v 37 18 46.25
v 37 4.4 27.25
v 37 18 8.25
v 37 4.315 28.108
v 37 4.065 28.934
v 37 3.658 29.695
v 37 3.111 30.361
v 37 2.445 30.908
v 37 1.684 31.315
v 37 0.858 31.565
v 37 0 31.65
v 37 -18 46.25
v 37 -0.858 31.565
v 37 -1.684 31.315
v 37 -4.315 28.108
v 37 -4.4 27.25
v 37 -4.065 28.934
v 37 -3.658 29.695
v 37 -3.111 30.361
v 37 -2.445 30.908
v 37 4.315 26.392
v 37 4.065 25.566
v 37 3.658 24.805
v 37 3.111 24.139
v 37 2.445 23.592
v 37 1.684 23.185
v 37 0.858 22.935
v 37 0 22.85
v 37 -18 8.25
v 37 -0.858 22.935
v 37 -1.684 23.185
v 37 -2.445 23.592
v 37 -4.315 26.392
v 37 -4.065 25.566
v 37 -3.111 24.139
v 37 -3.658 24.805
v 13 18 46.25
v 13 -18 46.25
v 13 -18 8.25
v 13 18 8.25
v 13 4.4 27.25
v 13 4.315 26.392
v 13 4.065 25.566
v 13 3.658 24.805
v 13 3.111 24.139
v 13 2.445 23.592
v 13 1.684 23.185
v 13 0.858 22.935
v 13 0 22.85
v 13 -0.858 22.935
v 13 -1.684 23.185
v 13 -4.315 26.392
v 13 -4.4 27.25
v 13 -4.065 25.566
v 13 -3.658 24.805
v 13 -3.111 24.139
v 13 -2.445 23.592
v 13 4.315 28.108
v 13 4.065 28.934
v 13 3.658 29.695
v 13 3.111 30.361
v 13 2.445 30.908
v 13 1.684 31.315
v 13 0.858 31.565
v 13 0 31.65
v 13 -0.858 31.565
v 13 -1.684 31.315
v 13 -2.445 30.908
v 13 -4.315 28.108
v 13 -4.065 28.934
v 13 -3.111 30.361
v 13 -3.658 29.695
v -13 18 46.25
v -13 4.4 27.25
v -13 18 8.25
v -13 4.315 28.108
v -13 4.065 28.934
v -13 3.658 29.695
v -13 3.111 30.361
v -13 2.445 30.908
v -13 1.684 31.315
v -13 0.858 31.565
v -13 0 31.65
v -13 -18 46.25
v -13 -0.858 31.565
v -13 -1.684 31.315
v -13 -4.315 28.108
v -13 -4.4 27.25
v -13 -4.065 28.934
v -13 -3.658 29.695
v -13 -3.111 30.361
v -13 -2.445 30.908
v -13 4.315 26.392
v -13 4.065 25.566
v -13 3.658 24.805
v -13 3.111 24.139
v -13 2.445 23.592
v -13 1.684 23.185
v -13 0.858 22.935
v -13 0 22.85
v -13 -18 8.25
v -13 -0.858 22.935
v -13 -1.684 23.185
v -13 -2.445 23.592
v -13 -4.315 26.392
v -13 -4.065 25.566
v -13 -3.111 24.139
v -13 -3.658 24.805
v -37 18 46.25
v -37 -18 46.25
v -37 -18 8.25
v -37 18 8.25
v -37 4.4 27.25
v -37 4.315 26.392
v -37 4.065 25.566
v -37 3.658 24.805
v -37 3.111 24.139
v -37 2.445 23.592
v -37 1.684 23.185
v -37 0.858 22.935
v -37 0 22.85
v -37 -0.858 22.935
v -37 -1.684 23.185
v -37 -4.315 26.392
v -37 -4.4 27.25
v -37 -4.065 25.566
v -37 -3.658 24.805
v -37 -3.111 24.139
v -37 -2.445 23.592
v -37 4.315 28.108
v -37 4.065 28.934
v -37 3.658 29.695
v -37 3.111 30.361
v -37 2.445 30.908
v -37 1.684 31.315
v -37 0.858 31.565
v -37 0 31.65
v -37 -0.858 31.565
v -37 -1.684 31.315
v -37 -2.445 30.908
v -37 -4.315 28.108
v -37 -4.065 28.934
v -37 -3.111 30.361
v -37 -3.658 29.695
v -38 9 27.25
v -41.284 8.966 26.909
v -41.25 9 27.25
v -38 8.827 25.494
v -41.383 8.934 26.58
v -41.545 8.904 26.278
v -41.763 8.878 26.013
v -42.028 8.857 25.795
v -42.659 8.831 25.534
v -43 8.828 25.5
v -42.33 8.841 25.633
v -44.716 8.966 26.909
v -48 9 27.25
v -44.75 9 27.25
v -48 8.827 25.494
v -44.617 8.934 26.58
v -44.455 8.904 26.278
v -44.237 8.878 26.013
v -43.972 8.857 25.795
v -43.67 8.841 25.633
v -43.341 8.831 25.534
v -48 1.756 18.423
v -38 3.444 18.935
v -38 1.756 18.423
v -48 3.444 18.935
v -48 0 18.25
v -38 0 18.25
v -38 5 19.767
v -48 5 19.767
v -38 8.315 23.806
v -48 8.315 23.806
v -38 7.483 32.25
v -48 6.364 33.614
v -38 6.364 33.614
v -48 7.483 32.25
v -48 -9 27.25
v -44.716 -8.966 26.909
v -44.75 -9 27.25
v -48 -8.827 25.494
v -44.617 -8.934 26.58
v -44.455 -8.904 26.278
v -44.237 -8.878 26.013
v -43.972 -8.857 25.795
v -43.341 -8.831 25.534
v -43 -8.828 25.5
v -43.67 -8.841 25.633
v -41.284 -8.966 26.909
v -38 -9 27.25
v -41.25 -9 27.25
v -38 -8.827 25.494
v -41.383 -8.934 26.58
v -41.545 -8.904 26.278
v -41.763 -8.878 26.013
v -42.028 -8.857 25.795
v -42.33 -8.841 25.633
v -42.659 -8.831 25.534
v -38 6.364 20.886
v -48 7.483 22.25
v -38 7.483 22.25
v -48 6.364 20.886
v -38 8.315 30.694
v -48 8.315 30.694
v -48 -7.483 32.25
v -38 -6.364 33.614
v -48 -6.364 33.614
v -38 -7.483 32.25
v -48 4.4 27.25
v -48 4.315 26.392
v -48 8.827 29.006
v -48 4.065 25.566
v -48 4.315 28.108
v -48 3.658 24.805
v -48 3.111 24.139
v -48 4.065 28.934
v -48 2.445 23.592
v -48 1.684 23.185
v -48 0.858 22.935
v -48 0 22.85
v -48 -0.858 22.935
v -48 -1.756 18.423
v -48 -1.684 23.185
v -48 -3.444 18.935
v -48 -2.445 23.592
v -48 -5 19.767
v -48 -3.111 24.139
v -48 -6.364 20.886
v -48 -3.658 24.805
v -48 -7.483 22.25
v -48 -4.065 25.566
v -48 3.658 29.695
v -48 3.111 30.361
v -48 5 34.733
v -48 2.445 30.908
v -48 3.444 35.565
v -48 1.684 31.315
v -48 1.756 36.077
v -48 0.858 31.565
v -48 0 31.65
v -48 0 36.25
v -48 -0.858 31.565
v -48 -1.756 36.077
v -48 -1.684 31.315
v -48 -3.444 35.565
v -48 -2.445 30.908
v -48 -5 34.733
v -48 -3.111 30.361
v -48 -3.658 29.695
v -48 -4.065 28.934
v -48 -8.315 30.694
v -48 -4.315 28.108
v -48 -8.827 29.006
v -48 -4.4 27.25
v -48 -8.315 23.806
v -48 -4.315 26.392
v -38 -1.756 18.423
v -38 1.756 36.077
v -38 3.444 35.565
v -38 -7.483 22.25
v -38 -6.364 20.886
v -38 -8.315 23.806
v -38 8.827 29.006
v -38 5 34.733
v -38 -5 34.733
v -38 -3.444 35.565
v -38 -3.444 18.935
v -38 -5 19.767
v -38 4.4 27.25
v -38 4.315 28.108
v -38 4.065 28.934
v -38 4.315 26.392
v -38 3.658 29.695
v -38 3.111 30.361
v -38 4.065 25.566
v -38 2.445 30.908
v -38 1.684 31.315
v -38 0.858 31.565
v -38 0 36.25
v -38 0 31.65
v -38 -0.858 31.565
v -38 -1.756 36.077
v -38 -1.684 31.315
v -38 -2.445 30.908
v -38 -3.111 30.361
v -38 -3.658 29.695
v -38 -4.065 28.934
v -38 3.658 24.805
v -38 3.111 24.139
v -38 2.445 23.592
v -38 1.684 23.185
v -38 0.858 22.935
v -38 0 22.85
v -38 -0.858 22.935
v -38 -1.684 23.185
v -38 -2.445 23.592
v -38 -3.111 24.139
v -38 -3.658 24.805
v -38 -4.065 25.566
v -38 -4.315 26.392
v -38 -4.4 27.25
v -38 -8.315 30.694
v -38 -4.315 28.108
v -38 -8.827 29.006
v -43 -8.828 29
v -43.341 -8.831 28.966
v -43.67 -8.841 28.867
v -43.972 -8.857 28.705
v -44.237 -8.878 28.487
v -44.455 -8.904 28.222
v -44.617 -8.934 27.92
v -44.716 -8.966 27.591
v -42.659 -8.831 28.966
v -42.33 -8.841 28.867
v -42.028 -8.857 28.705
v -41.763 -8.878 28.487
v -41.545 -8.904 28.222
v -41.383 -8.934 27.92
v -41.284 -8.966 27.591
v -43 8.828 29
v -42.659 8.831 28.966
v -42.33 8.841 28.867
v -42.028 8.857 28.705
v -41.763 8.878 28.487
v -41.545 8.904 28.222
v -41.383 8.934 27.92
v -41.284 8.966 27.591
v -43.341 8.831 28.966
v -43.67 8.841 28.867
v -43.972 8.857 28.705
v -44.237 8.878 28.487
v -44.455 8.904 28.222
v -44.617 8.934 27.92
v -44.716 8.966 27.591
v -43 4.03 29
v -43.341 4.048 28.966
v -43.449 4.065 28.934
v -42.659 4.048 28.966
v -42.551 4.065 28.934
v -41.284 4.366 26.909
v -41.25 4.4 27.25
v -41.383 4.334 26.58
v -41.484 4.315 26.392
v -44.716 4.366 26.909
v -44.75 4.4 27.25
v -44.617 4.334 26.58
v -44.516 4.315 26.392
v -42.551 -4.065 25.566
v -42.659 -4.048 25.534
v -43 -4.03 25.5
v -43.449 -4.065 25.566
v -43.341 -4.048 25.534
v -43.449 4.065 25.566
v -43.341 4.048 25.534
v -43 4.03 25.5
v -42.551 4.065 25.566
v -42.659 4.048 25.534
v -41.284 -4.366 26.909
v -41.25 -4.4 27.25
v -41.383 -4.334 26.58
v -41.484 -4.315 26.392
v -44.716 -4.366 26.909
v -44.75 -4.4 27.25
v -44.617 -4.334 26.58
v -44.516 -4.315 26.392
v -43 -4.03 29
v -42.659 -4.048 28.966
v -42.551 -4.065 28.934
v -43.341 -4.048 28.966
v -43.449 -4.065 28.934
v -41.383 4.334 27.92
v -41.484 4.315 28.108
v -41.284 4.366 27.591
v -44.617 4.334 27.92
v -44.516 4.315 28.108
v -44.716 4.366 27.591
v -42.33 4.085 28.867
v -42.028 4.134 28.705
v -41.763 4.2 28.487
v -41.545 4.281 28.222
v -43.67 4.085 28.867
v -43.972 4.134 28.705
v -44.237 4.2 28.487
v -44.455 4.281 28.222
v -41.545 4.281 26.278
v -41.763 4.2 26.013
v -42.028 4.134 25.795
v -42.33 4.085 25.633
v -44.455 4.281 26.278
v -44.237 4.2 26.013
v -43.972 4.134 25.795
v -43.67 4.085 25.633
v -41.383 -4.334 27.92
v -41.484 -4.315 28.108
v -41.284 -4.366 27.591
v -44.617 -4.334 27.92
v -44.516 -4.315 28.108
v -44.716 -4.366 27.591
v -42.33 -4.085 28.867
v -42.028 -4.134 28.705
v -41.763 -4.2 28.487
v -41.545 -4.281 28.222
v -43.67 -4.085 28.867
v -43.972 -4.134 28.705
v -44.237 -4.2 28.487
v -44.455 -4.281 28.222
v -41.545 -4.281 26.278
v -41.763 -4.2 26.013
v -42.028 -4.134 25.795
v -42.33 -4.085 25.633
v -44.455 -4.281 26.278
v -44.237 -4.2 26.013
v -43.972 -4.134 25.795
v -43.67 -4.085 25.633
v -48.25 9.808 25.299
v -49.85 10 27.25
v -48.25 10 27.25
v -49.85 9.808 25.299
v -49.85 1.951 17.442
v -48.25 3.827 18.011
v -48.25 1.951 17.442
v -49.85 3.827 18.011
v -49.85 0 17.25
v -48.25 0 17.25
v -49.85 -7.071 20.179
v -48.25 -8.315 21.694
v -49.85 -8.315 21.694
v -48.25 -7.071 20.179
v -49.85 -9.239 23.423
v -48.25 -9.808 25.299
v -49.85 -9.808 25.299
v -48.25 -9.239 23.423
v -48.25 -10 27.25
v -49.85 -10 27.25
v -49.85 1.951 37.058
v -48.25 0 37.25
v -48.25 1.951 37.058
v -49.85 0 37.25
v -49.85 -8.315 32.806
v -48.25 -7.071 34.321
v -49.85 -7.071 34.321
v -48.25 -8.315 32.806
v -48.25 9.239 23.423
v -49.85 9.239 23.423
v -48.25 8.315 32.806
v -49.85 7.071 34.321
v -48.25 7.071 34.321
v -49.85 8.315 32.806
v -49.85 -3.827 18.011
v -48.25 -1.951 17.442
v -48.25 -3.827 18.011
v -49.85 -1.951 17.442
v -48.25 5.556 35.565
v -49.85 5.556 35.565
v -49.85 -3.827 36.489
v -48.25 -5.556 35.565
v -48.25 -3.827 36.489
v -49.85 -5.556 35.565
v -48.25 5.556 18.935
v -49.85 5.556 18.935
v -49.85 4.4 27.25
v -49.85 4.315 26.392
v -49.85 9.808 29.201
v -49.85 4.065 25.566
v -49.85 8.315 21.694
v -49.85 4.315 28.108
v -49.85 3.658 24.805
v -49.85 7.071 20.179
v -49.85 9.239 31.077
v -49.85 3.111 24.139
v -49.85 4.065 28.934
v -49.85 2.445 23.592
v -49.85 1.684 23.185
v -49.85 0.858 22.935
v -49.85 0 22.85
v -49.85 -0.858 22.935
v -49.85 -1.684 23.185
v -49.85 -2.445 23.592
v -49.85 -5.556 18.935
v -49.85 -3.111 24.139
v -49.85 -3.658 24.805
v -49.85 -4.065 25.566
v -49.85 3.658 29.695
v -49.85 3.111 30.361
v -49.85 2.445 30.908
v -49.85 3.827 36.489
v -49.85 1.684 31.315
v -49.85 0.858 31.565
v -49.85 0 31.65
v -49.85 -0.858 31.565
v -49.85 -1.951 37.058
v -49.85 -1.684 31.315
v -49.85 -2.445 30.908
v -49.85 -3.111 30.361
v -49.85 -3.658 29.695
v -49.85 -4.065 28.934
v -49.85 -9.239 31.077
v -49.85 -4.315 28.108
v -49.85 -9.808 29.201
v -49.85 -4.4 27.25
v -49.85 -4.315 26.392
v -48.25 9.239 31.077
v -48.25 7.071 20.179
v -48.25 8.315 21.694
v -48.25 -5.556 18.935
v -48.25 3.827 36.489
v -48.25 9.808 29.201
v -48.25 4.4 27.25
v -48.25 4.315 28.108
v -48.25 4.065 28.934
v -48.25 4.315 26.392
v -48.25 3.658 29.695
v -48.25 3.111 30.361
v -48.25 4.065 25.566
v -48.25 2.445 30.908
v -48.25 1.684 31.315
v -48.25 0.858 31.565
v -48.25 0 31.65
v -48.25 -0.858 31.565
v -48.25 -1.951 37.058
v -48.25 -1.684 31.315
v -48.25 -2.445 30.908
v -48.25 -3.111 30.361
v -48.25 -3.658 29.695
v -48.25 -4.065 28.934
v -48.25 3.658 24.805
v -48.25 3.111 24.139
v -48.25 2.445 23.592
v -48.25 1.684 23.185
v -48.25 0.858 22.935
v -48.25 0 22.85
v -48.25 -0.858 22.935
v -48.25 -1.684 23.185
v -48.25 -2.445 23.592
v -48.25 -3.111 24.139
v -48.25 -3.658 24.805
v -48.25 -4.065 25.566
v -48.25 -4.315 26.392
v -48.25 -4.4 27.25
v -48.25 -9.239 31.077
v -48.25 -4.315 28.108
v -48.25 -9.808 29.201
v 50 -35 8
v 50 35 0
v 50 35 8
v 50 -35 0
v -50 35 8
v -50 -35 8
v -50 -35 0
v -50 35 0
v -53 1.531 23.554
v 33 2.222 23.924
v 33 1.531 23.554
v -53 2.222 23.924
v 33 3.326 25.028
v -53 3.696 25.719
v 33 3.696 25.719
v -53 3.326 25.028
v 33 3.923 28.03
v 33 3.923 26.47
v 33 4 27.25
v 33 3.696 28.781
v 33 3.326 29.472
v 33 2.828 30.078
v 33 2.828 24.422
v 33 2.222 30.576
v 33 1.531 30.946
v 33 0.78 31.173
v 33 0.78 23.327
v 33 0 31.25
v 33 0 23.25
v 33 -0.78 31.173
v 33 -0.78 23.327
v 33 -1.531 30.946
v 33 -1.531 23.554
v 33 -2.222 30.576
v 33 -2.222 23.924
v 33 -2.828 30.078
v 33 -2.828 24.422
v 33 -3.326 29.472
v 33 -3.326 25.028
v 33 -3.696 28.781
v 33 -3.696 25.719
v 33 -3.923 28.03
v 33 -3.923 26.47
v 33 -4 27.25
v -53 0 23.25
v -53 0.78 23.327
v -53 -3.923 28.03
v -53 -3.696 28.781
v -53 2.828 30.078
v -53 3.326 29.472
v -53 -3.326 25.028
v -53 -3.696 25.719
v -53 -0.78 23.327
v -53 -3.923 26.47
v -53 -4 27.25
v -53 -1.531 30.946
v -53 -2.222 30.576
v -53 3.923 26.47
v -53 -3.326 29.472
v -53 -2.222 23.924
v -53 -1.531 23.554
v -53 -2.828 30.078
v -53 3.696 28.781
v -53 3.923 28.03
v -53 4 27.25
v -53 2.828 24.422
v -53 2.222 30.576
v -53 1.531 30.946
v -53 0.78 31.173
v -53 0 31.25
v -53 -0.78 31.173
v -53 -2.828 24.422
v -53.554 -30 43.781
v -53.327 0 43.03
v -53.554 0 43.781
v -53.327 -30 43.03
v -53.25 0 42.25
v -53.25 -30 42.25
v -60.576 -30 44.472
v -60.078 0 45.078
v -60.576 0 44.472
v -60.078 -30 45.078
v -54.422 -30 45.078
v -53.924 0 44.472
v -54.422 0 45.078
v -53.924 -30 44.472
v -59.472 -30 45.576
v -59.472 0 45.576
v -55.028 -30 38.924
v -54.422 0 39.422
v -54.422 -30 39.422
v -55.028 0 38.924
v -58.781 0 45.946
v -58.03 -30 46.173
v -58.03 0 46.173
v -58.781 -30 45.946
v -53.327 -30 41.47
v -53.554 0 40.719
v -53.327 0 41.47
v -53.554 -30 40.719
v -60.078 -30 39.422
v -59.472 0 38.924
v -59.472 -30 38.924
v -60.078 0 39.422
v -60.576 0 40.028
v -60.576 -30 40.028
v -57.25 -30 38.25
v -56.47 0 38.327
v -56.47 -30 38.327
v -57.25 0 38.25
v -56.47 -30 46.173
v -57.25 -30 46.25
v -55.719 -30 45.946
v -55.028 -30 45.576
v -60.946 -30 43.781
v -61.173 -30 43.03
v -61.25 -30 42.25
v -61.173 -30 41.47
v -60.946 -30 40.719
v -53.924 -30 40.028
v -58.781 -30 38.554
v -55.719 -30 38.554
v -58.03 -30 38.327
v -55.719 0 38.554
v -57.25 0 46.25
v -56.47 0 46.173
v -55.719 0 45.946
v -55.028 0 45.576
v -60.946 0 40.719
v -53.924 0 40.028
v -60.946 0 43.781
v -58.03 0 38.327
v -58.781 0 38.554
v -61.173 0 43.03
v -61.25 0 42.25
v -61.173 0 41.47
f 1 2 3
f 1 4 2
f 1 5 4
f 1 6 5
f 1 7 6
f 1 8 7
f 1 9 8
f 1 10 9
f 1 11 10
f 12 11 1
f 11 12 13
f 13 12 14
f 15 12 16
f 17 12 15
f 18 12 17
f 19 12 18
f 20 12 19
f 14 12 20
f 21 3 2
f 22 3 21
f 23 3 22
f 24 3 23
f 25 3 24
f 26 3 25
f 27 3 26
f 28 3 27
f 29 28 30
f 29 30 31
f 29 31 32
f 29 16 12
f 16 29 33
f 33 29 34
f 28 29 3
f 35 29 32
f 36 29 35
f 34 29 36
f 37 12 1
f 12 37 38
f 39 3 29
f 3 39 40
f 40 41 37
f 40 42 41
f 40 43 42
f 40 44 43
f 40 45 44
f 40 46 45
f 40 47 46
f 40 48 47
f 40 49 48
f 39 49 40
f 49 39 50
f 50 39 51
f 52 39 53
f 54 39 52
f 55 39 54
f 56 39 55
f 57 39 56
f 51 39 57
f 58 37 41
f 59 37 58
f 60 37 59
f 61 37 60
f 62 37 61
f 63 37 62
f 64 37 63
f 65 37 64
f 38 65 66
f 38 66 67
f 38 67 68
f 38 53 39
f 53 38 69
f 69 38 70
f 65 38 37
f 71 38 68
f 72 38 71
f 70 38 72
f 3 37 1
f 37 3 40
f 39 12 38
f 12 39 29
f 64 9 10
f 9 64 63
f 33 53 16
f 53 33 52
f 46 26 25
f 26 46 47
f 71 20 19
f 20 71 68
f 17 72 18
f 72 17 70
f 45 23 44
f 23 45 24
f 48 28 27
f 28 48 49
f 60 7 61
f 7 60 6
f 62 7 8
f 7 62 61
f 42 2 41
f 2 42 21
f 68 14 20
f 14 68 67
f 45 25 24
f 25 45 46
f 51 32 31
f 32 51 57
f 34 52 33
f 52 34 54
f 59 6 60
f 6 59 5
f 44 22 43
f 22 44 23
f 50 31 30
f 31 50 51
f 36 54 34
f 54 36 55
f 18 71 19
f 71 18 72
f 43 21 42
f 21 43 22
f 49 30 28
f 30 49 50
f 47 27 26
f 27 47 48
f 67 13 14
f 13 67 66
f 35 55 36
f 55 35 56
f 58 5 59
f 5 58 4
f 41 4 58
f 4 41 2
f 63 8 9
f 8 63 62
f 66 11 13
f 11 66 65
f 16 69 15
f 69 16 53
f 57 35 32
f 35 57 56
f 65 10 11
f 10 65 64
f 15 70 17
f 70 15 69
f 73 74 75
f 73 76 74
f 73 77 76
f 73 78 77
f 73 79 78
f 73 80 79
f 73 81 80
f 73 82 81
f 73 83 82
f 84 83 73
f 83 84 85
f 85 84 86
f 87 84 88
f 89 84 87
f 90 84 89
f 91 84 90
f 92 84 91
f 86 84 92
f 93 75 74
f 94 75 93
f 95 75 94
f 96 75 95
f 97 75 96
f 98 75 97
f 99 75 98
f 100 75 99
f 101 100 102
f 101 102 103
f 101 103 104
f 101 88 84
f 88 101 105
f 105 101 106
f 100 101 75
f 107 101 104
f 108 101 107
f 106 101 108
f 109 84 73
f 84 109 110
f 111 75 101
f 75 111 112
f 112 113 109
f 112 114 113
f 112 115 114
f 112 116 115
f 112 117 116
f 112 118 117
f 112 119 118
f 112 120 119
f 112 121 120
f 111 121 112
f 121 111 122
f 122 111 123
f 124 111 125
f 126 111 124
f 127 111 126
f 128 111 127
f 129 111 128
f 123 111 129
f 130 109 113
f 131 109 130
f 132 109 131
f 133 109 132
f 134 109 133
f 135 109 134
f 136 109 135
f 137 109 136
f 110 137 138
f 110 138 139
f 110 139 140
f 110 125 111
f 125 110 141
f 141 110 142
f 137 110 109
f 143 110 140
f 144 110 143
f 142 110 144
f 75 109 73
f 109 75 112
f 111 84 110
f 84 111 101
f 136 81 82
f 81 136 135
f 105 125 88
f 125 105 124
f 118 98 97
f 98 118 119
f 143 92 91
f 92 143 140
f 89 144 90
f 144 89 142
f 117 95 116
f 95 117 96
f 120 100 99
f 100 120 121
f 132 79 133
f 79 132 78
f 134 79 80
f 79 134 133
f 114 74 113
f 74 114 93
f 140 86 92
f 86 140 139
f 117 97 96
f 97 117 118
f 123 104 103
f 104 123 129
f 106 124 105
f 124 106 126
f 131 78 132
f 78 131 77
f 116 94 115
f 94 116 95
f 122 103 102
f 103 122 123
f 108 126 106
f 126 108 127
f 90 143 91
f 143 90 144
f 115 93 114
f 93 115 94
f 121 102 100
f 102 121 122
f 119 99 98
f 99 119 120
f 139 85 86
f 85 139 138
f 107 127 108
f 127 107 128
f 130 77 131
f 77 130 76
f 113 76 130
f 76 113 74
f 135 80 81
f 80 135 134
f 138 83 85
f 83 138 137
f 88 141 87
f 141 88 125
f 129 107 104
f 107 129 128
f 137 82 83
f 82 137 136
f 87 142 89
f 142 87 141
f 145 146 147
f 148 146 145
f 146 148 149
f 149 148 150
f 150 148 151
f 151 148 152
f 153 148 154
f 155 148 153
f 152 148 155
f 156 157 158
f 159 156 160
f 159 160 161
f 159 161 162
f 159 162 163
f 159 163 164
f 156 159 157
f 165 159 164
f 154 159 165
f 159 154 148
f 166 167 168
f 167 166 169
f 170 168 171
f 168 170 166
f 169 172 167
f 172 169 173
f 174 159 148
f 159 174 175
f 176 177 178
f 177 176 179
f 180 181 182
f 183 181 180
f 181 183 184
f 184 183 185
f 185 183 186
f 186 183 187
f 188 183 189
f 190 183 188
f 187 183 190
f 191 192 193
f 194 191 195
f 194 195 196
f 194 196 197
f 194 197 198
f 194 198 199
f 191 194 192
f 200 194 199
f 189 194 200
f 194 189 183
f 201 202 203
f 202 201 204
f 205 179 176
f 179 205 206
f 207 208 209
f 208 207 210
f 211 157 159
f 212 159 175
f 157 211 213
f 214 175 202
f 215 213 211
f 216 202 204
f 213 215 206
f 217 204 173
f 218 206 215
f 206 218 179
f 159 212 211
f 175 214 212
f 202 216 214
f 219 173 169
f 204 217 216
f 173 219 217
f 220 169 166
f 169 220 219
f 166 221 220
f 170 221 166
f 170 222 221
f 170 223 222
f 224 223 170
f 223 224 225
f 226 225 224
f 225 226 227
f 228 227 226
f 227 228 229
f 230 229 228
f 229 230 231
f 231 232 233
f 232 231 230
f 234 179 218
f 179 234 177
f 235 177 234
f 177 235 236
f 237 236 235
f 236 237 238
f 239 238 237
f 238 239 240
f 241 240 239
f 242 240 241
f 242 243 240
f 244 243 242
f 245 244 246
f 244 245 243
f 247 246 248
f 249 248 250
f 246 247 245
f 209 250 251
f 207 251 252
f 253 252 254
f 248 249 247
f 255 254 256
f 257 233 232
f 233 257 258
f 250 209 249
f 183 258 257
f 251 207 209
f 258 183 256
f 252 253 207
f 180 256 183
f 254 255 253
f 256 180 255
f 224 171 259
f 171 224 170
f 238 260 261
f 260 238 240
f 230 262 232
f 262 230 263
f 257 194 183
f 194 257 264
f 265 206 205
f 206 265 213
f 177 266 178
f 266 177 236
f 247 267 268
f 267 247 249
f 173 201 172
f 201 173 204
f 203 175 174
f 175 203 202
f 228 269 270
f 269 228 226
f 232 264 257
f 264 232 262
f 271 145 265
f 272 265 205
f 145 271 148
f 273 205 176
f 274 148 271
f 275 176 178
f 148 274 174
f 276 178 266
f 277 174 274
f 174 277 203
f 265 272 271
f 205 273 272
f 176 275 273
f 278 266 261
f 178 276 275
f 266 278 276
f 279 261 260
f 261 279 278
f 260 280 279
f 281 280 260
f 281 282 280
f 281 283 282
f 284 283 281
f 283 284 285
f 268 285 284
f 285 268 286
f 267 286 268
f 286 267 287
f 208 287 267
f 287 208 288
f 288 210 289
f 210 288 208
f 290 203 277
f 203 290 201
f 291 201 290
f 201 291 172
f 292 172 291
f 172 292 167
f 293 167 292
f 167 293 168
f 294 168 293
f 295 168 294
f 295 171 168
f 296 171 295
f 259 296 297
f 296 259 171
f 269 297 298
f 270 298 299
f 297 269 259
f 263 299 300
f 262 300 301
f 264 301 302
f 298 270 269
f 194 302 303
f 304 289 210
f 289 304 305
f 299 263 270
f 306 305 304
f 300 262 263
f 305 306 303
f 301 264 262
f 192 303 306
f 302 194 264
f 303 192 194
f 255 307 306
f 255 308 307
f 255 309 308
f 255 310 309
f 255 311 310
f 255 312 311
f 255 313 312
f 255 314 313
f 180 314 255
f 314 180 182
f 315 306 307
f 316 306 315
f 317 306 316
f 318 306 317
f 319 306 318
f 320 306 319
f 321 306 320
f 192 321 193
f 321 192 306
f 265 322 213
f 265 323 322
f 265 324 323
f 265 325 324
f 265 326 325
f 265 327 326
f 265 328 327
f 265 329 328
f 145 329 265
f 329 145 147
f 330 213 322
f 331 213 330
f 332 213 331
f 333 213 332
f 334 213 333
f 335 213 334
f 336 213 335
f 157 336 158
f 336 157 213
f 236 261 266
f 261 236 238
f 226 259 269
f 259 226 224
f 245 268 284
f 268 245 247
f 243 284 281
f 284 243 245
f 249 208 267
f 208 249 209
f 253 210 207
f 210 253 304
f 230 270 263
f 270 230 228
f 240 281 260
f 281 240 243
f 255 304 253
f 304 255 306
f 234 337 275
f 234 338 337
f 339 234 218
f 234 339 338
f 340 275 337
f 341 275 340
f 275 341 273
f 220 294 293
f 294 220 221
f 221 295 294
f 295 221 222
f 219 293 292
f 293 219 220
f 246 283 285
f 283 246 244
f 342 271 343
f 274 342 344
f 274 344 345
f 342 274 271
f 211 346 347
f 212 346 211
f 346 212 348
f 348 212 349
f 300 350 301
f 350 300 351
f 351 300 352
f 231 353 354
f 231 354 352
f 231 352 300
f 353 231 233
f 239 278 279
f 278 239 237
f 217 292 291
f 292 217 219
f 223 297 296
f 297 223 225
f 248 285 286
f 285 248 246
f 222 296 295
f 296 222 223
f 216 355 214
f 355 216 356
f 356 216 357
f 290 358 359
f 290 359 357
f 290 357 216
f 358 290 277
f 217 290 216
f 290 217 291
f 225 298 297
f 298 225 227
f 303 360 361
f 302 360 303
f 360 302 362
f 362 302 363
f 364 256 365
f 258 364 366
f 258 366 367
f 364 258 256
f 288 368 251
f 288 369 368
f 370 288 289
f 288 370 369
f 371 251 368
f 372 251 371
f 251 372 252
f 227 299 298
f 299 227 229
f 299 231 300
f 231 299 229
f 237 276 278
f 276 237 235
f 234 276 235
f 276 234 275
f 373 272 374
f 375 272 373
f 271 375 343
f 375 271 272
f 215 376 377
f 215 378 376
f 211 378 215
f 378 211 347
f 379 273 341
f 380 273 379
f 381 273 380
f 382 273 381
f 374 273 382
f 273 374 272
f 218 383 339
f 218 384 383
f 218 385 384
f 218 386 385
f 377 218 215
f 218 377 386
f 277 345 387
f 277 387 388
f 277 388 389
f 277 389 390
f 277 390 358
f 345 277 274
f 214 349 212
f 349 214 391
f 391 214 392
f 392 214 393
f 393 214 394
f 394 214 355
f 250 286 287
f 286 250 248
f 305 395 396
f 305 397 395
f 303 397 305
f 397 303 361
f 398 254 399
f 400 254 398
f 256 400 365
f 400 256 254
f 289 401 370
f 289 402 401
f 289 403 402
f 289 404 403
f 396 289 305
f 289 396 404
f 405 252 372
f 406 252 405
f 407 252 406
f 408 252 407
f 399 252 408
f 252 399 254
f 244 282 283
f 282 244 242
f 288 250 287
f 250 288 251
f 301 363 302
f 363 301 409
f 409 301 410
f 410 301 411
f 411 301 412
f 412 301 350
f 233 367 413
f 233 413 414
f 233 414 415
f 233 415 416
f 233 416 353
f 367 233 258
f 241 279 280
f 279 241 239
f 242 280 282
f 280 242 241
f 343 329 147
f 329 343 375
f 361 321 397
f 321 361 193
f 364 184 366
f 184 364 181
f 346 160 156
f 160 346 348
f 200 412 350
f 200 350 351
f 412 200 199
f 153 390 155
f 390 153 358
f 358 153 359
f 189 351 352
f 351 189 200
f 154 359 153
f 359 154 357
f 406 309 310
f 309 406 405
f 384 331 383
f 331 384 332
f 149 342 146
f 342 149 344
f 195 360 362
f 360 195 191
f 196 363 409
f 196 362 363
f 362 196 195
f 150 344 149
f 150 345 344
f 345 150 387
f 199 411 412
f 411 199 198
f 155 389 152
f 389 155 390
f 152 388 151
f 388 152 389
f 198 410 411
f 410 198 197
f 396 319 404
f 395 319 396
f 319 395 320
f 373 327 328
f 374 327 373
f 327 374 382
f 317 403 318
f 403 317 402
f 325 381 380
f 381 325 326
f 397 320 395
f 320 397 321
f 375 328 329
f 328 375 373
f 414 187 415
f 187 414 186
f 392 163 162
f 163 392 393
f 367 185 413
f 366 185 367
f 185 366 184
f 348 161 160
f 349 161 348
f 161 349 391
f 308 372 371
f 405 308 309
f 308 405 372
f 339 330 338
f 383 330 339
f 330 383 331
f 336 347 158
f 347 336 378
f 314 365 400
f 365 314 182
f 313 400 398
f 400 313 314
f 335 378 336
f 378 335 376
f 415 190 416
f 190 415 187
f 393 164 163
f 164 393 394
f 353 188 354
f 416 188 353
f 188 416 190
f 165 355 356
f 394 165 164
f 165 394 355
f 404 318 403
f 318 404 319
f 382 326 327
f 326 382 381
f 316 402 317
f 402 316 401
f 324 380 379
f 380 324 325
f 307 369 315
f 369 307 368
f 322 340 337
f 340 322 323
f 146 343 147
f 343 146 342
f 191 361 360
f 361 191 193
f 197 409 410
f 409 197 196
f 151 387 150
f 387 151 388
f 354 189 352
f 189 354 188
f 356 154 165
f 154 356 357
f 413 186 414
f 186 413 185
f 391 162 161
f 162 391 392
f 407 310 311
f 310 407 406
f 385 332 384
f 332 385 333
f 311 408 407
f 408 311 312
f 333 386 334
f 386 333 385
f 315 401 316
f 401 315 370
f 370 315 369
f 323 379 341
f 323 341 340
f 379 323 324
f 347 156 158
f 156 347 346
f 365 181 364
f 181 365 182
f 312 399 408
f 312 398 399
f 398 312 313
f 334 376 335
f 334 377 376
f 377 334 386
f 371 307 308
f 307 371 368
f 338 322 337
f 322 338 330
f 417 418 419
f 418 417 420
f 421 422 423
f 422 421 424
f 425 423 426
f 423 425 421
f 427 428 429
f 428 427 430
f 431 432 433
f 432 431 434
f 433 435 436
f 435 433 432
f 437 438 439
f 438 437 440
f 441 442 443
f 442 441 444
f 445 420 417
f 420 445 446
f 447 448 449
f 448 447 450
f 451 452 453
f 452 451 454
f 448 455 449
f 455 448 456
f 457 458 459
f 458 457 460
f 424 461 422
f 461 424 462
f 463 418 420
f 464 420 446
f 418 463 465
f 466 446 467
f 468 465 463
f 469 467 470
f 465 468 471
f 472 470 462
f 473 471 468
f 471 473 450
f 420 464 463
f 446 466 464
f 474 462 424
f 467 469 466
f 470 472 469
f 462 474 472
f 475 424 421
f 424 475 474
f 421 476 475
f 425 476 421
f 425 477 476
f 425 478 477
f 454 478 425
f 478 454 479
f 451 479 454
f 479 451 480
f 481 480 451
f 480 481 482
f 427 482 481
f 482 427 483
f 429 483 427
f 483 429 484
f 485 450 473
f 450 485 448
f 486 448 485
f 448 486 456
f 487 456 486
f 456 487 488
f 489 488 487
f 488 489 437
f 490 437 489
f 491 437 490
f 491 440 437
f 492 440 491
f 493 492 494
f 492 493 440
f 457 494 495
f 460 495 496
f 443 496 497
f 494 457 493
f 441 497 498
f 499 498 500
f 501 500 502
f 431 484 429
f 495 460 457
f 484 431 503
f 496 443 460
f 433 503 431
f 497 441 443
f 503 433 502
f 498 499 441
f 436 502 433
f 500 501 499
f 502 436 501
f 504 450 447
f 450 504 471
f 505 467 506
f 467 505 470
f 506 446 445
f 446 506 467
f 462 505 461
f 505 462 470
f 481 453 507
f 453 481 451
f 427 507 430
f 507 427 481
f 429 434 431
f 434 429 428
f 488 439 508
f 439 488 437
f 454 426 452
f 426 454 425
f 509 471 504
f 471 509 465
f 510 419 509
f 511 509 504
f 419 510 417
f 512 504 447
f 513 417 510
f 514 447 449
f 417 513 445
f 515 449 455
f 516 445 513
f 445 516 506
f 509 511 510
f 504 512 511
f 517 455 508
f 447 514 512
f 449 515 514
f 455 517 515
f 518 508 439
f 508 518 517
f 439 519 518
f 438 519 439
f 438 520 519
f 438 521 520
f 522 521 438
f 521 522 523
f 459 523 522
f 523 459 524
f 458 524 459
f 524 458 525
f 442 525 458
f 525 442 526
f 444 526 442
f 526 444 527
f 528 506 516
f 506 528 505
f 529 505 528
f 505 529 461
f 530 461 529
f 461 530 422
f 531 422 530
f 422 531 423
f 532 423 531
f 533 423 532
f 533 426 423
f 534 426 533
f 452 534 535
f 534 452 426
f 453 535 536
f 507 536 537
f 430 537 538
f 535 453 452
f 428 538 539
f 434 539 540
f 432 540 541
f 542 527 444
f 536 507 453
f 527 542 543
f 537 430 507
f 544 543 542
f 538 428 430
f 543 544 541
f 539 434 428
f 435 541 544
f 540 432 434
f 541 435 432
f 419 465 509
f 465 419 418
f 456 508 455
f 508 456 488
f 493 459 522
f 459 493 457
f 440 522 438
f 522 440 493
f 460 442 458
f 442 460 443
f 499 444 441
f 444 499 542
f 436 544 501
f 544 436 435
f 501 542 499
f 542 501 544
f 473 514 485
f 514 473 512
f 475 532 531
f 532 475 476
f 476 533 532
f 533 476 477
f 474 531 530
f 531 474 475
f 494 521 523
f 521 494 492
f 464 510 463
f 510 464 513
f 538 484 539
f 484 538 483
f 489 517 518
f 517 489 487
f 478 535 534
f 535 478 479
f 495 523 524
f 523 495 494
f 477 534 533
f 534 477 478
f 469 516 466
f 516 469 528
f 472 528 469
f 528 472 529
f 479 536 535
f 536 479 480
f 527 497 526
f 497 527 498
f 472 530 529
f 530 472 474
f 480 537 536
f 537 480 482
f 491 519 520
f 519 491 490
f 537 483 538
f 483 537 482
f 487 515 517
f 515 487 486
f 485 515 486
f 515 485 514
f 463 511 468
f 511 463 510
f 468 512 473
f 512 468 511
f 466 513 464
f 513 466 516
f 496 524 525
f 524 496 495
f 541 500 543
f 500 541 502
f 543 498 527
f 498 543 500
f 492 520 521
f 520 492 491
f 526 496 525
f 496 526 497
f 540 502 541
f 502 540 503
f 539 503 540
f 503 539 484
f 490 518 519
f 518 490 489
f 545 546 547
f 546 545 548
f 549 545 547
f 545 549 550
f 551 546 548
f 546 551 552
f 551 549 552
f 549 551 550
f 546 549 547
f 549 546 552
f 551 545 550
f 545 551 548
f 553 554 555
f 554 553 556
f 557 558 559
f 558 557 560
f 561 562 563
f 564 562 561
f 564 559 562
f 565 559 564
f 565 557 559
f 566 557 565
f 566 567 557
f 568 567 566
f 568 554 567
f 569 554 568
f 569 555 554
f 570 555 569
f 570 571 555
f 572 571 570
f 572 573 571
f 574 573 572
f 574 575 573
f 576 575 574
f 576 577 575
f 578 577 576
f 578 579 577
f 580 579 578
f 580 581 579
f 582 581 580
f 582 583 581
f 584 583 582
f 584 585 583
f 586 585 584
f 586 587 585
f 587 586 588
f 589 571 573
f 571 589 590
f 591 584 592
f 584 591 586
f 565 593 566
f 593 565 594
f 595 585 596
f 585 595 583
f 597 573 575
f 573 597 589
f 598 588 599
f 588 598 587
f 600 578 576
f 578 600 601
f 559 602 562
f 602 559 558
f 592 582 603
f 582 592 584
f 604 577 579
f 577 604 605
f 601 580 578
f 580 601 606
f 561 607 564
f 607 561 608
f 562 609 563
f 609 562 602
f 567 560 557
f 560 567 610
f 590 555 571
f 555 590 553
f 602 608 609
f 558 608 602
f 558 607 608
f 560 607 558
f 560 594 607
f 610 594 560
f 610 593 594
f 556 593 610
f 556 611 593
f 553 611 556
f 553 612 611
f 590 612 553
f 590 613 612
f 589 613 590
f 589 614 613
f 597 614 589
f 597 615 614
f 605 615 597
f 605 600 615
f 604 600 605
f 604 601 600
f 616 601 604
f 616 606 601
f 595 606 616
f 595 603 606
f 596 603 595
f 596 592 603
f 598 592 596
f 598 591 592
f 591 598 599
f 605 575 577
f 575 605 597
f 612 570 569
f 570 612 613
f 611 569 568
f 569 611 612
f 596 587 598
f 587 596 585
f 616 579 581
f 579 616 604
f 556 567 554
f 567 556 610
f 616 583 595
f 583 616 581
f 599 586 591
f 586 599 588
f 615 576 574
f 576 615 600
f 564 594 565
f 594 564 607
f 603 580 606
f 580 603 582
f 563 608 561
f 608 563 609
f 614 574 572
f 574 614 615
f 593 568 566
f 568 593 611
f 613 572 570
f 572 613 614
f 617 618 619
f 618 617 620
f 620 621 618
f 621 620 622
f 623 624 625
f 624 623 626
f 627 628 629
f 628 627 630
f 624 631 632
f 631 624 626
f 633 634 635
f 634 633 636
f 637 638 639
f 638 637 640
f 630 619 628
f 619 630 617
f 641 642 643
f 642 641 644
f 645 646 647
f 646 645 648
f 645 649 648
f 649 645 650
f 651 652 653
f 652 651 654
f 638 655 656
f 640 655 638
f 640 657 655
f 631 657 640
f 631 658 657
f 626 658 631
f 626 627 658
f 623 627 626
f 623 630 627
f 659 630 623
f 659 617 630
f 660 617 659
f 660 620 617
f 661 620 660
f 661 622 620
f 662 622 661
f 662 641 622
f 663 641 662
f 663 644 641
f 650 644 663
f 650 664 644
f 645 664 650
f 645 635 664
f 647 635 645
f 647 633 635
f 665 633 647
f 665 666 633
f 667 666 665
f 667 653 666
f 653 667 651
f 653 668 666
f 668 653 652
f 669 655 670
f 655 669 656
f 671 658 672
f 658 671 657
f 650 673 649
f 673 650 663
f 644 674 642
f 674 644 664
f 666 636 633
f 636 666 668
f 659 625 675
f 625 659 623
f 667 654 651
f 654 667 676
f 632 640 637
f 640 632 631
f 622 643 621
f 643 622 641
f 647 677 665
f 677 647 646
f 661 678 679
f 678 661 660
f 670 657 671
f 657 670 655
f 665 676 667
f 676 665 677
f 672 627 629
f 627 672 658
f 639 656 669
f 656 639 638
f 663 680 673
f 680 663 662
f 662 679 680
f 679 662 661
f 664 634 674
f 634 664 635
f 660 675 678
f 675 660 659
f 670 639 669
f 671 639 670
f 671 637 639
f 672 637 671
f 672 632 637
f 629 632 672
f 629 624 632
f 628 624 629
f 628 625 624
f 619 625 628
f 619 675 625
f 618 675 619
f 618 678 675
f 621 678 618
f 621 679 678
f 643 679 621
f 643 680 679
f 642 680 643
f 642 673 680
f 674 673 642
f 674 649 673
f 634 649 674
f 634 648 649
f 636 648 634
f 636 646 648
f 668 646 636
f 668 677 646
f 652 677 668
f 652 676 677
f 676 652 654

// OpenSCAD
$fn = 32;

// ------------------------------------------------------------------------
// Machine vise: screw d8, jaws 24 x 38 mm
// Every part is its own module, assembly() places every instance.
// ------------------------------------------------------------------------

// --- part 1 ---
module vise_bed() {
  difference() {
    translate([-50, -35, 0]) cube([100, 70, 8]);
  }
}

// --- part 2 ---
module vise_jaw() {
  difference() {
    translate([-12, -18, 0]) cube([24, 36, 38]);
    translate([0, 0, 19]) rotate([0, 90, 0]) cylinder(h = 26, d = 8.8, center = true);
  }
}

// --- part 3 ---
module vise_screw() {
  translate([0, 0, -43]) cylinder(h = 86, d = 8);
}

// --- part 4 ---
module screw_collar() {
  difference() {
    cylinder(h = 10, d = 18);
    translate([0, 0, -1]) cylinder(h = 12, d = 8.8);
    translate([0, 0, 5]) rotate([90, 0, 0]) cylinder(h = 20, d = 3.5, center = true);
  }
}

// --- part 5 ---
module screw_washer() {
  difference() {
      translate([0, 0, 0]) cylinder(h = 1.6, d = 20);
      translate([0, 0, -1]) cylinder(h = 3.6, d = 8.8);
    }
}

// --- part 6 ---
module vise_handle() {
  cylinder(h = 30, d = 8);
}

// --- assembly ---
module assembly() {
  color([0.80, 0.24, 0.20]) translate([0, 0, 0]) rotate([0, 0, 0]) vise_bed();
  color([0.20, 0.45, 0.75]) translate([25, 0, 8.25]) rotate([0, 0, 0]) vise_jaw();
  color([0.25, 0.62, 0.32]) translate([-25, 0, 8.25]) rotate([0, 0, 0]) vise_jaw();
  color([0.92, 0.70, 0.18]) translate([-10, 0, 27.25]) rotate([0, 90, 0]) vise_screw();
  color([0.58, 0.35, 0.70]) translate([-48, 0, 27.25]) rotate([0, 90, 0]) screw_collar();
  color([0.16, 0.66, 0.66]) translate([-49.85, 0, 27.25]) rotate([0, 90, 0]) screw_washer();
  color([0.85, 0.48, 0.18]) translate([-57.25, 0, 42.25]) rotate([90, 0, 0]) vise_handle();
}

assembly();
